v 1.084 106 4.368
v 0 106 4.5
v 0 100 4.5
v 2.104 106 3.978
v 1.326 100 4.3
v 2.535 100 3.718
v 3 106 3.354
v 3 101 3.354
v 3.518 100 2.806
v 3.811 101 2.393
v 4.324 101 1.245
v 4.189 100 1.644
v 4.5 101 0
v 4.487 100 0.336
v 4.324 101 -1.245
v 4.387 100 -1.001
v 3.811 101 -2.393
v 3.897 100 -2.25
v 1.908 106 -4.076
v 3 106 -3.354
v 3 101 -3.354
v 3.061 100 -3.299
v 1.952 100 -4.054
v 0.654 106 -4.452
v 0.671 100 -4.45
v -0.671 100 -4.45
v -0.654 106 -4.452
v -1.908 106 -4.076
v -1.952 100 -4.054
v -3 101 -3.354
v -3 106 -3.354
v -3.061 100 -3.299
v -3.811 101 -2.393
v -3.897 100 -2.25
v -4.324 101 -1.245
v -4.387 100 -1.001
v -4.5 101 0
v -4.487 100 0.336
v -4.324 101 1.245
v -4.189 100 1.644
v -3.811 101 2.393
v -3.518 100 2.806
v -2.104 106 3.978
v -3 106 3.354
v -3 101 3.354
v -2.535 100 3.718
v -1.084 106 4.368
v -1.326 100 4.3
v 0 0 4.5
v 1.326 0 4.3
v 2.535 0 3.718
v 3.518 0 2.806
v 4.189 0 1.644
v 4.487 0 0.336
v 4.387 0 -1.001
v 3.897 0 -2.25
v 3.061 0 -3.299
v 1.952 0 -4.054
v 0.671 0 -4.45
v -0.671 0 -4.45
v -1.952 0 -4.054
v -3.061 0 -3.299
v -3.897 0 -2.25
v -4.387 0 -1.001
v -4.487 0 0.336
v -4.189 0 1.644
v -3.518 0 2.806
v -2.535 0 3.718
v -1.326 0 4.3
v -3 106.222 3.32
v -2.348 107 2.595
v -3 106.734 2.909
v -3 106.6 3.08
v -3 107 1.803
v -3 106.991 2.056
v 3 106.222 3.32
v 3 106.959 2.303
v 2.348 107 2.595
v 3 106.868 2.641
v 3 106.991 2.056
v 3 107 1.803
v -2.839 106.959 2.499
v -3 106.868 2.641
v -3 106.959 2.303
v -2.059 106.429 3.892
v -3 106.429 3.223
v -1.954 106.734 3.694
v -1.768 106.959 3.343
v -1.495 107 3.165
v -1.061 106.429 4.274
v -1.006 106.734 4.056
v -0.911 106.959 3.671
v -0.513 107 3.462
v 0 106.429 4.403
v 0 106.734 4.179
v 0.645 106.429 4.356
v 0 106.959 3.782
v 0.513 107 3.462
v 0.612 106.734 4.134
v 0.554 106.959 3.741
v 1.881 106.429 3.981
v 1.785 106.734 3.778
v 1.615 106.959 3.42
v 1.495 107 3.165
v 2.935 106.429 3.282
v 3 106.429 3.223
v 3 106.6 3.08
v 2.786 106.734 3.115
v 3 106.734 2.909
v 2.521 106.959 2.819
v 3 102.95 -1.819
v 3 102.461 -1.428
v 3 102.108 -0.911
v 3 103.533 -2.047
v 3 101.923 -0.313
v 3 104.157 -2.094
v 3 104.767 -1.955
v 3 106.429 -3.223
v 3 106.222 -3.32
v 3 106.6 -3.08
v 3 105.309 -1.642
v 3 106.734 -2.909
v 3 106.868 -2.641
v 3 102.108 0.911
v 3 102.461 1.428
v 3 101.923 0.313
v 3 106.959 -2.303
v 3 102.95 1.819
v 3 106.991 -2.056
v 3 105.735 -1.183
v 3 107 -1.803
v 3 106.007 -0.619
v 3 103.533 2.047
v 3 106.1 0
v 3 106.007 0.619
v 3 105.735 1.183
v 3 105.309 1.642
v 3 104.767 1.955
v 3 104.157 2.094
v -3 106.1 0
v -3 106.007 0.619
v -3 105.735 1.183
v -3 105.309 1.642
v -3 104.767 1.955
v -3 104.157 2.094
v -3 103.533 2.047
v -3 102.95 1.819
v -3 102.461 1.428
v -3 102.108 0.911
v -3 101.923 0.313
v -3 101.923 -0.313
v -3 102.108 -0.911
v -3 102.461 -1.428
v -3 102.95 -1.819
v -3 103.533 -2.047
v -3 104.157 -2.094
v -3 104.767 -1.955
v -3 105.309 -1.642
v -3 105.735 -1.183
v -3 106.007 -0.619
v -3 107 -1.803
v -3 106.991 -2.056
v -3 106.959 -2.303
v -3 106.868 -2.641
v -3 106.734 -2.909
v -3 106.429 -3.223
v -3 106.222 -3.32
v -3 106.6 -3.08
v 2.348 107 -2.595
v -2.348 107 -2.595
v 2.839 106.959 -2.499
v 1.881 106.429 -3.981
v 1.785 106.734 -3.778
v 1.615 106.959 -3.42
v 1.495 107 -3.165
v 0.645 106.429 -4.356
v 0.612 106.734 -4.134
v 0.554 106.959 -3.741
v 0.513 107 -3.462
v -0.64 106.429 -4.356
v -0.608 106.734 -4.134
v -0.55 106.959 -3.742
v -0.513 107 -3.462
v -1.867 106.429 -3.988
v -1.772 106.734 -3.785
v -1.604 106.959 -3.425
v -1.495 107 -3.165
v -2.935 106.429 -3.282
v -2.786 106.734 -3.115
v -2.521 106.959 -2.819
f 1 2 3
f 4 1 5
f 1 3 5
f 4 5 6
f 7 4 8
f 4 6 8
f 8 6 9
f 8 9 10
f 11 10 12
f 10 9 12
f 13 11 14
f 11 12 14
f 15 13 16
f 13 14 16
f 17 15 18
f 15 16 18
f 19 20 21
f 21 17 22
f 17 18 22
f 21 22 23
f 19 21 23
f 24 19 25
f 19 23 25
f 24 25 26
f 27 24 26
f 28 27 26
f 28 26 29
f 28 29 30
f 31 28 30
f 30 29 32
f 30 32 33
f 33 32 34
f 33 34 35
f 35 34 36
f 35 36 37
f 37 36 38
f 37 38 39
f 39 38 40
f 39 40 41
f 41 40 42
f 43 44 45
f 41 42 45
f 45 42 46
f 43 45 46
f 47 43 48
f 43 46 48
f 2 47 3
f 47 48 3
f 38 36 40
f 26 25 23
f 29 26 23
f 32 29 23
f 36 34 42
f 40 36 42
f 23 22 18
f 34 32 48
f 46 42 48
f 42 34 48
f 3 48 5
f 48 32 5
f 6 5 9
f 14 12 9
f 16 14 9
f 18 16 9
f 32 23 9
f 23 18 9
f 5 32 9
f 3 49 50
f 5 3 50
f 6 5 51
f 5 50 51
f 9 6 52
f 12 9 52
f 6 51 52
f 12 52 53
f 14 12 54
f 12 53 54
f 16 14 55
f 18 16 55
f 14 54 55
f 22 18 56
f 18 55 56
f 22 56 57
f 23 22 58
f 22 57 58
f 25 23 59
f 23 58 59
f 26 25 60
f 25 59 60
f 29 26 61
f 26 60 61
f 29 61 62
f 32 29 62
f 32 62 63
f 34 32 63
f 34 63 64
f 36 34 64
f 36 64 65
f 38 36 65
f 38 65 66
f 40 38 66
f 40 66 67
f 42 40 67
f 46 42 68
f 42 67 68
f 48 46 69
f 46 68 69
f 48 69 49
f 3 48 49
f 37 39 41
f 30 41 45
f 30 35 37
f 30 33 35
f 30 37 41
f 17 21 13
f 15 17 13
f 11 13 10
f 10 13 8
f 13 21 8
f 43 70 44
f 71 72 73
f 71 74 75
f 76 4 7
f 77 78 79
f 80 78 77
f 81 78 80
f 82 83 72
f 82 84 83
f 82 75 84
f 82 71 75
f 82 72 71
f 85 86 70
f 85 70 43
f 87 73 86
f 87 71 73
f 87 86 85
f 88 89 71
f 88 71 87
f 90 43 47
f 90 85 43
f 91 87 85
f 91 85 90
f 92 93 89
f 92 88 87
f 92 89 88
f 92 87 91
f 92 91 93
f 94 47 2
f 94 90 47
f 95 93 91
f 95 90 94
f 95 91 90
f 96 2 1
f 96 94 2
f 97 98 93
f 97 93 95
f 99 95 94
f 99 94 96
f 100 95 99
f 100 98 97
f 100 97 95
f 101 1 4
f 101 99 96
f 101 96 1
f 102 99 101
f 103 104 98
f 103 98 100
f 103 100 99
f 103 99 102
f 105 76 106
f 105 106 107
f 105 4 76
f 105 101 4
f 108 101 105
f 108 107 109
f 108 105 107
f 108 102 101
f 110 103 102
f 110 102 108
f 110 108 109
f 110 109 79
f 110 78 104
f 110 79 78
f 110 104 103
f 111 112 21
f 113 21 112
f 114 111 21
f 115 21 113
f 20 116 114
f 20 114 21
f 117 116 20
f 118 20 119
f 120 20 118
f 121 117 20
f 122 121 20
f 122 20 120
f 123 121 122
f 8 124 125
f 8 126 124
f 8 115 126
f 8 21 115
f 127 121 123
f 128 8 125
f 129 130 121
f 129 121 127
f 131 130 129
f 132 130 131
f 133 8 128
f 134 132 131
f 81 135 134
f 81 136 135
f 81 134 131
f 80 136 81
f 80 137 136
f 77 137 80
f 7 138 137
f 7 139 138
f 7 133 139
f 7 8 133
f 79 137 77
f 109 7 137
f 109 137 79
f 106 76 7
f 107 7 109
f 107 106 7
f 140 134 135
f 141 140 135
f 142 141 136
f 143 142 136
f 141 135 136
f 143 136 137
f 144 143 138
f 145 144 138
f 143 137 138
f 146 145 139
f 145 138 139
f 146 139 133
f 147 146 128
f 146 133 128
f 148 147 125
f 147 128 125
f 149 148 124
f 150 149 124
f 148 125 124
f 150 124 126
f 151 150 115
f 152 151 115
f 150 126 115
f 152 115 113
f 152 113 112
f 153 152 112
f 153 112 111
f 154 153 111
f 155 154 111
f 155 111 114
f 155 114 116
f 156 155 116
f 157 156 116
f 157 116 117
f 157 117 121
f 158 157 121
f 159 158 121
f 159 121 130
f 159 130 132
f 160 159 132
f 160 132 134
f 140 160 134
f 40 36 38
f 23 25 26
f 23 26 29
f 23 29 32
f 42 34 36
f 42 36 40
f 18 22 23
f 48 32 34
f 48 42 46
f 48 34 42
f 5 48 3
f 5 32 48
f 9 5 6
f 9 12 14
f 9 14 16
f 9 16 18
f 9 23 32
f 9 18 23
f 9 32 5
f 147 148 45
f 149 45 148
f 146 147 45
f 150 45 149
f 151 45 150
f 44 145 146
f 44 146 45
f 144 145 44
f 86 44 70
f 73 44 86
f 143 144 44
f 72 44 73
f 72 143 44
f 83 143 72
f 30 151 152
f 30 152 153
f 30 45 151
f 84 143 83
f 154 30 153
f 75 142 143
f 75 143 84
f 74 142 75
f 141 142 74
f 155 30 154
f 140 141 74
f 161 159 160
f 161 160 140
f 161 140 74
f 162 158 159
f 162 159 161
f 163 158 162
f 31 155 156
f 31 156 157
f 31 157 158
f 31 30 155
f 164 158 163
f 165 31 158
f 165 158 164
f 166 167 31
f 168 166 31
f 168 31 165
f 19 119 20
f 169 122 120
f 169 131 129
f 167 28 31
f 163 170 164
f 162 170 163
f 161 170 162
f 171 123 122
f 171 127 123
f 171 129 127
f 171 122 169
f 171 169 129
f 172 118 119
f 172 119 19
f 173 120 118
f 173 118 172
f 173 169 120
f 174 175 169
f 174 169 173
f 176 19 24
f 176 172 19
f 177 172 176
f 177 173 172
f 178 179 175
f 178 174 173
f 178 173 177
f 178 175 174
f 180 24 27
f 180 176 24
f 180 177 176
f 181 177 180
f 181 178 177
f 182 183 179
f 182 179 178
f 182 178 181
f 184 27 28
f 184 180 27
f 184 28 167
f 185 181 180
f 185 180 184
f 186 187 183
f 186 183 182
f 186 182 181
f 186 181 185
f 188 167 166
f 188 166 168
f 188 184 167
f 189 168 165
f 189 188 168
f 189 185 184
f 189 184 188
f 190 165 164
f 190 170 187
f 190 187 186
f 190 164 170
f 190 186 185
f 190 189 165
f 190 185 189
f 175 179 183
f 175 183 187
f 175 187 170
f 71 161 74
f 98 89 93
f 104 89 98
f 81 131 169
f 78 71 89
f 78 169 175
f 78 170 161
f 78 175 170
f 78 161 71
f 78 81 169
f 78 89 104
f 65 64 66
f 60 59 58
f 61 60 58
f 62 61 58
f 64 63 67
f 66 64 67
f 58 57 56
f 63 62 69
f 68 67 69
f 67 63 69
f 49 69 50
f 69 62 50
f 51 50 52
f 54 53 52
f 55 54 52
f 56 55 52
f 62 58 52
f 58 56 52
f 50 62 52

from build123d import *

# Parameters (mm, degrees)
SKETCH_1_R          = 4.5
EXTRUDE_1_DEPTH     = 100
SKETCH_2_R          = 4.5
EXTRUDE_2_DEPTH     = 7
FILLET_1_R          = 1
SKETCH_3_W          = 2.376360743
SKETCH_3_H          = 9.201019787
CUT_EXTRUDE_3_DEPTH = 13.5
SKETCH_4_R          = 2.1
CUT_EXTRUDE_4_DEPTH = 108.356881579


with BuildPart() as part:
    # Эскиз1 → Вытянуть1 (new body)
    with BuildSketch(Plane(origin=(0, 0, 0), x_dir=(1, 0, 0), z_dir=(0, 1, 0))):
        with Locations(Location((0, 0, 0), (0, 0, 270))):
            Circle(SKETCH_1_R)
    extrude(amount=EXTRUDE_1_DEPTH)


with BuildPart() as body_2:
    # Эскиз2 → Вытянуть2 (new body)
    with BuildSketch(Plane(origin=(0, 100, 0), x_dir=(1, 0, 0), z_dir=(0, 1, 0))):
        with Locations(Location((0, 0, 0), (0, 0, 270))):
            Circle(SKETCH_2_R)
    extrude(amount=EXTRUDE_2_DEPTH)

    # Скругление1
    fillet_1_edges = [body_2.edges().sort_by_distance(p)[0] for p in [
        (0, 107, -4.5),
    ]]
    fillet(fillet_1_edges, radius=FILLET_1_R)

    # Эскиз3 → Вытянуть3 (cut, symmetric)
    with BuildSketch(Plane.XY):
        with Locations((-4.188180371, 105.600509894)):
            Rectangle(SKETCH_3_W, SKETCH_3_H)
        with Locations((4.188180371, 105.600509894)):
            Rectangle(SKETCH_3_W, SKETCH_3_H)
    extrude(amount=CUT_EXTRUDE_3_DEPTH, both=True, mode=Mode.SUBTRACT)

    # Эскиз4 → Вытянуть4 (cut, through all)
    with BuildSketch(Plane(origin=(3, 0, 0), x_dir=(0, 0, -1), z_dir=(1, 0, 0))):
        with Locations(Location((0, 104, 0), (0, 0, 90))):
            Circle(SKETCH_4_R)
    extrude(amount=-CUT_EXTRUDE_4_DEPTH, mode=Mode.SUBTRACT)


solid = Compound([part.part, body_2.part])
